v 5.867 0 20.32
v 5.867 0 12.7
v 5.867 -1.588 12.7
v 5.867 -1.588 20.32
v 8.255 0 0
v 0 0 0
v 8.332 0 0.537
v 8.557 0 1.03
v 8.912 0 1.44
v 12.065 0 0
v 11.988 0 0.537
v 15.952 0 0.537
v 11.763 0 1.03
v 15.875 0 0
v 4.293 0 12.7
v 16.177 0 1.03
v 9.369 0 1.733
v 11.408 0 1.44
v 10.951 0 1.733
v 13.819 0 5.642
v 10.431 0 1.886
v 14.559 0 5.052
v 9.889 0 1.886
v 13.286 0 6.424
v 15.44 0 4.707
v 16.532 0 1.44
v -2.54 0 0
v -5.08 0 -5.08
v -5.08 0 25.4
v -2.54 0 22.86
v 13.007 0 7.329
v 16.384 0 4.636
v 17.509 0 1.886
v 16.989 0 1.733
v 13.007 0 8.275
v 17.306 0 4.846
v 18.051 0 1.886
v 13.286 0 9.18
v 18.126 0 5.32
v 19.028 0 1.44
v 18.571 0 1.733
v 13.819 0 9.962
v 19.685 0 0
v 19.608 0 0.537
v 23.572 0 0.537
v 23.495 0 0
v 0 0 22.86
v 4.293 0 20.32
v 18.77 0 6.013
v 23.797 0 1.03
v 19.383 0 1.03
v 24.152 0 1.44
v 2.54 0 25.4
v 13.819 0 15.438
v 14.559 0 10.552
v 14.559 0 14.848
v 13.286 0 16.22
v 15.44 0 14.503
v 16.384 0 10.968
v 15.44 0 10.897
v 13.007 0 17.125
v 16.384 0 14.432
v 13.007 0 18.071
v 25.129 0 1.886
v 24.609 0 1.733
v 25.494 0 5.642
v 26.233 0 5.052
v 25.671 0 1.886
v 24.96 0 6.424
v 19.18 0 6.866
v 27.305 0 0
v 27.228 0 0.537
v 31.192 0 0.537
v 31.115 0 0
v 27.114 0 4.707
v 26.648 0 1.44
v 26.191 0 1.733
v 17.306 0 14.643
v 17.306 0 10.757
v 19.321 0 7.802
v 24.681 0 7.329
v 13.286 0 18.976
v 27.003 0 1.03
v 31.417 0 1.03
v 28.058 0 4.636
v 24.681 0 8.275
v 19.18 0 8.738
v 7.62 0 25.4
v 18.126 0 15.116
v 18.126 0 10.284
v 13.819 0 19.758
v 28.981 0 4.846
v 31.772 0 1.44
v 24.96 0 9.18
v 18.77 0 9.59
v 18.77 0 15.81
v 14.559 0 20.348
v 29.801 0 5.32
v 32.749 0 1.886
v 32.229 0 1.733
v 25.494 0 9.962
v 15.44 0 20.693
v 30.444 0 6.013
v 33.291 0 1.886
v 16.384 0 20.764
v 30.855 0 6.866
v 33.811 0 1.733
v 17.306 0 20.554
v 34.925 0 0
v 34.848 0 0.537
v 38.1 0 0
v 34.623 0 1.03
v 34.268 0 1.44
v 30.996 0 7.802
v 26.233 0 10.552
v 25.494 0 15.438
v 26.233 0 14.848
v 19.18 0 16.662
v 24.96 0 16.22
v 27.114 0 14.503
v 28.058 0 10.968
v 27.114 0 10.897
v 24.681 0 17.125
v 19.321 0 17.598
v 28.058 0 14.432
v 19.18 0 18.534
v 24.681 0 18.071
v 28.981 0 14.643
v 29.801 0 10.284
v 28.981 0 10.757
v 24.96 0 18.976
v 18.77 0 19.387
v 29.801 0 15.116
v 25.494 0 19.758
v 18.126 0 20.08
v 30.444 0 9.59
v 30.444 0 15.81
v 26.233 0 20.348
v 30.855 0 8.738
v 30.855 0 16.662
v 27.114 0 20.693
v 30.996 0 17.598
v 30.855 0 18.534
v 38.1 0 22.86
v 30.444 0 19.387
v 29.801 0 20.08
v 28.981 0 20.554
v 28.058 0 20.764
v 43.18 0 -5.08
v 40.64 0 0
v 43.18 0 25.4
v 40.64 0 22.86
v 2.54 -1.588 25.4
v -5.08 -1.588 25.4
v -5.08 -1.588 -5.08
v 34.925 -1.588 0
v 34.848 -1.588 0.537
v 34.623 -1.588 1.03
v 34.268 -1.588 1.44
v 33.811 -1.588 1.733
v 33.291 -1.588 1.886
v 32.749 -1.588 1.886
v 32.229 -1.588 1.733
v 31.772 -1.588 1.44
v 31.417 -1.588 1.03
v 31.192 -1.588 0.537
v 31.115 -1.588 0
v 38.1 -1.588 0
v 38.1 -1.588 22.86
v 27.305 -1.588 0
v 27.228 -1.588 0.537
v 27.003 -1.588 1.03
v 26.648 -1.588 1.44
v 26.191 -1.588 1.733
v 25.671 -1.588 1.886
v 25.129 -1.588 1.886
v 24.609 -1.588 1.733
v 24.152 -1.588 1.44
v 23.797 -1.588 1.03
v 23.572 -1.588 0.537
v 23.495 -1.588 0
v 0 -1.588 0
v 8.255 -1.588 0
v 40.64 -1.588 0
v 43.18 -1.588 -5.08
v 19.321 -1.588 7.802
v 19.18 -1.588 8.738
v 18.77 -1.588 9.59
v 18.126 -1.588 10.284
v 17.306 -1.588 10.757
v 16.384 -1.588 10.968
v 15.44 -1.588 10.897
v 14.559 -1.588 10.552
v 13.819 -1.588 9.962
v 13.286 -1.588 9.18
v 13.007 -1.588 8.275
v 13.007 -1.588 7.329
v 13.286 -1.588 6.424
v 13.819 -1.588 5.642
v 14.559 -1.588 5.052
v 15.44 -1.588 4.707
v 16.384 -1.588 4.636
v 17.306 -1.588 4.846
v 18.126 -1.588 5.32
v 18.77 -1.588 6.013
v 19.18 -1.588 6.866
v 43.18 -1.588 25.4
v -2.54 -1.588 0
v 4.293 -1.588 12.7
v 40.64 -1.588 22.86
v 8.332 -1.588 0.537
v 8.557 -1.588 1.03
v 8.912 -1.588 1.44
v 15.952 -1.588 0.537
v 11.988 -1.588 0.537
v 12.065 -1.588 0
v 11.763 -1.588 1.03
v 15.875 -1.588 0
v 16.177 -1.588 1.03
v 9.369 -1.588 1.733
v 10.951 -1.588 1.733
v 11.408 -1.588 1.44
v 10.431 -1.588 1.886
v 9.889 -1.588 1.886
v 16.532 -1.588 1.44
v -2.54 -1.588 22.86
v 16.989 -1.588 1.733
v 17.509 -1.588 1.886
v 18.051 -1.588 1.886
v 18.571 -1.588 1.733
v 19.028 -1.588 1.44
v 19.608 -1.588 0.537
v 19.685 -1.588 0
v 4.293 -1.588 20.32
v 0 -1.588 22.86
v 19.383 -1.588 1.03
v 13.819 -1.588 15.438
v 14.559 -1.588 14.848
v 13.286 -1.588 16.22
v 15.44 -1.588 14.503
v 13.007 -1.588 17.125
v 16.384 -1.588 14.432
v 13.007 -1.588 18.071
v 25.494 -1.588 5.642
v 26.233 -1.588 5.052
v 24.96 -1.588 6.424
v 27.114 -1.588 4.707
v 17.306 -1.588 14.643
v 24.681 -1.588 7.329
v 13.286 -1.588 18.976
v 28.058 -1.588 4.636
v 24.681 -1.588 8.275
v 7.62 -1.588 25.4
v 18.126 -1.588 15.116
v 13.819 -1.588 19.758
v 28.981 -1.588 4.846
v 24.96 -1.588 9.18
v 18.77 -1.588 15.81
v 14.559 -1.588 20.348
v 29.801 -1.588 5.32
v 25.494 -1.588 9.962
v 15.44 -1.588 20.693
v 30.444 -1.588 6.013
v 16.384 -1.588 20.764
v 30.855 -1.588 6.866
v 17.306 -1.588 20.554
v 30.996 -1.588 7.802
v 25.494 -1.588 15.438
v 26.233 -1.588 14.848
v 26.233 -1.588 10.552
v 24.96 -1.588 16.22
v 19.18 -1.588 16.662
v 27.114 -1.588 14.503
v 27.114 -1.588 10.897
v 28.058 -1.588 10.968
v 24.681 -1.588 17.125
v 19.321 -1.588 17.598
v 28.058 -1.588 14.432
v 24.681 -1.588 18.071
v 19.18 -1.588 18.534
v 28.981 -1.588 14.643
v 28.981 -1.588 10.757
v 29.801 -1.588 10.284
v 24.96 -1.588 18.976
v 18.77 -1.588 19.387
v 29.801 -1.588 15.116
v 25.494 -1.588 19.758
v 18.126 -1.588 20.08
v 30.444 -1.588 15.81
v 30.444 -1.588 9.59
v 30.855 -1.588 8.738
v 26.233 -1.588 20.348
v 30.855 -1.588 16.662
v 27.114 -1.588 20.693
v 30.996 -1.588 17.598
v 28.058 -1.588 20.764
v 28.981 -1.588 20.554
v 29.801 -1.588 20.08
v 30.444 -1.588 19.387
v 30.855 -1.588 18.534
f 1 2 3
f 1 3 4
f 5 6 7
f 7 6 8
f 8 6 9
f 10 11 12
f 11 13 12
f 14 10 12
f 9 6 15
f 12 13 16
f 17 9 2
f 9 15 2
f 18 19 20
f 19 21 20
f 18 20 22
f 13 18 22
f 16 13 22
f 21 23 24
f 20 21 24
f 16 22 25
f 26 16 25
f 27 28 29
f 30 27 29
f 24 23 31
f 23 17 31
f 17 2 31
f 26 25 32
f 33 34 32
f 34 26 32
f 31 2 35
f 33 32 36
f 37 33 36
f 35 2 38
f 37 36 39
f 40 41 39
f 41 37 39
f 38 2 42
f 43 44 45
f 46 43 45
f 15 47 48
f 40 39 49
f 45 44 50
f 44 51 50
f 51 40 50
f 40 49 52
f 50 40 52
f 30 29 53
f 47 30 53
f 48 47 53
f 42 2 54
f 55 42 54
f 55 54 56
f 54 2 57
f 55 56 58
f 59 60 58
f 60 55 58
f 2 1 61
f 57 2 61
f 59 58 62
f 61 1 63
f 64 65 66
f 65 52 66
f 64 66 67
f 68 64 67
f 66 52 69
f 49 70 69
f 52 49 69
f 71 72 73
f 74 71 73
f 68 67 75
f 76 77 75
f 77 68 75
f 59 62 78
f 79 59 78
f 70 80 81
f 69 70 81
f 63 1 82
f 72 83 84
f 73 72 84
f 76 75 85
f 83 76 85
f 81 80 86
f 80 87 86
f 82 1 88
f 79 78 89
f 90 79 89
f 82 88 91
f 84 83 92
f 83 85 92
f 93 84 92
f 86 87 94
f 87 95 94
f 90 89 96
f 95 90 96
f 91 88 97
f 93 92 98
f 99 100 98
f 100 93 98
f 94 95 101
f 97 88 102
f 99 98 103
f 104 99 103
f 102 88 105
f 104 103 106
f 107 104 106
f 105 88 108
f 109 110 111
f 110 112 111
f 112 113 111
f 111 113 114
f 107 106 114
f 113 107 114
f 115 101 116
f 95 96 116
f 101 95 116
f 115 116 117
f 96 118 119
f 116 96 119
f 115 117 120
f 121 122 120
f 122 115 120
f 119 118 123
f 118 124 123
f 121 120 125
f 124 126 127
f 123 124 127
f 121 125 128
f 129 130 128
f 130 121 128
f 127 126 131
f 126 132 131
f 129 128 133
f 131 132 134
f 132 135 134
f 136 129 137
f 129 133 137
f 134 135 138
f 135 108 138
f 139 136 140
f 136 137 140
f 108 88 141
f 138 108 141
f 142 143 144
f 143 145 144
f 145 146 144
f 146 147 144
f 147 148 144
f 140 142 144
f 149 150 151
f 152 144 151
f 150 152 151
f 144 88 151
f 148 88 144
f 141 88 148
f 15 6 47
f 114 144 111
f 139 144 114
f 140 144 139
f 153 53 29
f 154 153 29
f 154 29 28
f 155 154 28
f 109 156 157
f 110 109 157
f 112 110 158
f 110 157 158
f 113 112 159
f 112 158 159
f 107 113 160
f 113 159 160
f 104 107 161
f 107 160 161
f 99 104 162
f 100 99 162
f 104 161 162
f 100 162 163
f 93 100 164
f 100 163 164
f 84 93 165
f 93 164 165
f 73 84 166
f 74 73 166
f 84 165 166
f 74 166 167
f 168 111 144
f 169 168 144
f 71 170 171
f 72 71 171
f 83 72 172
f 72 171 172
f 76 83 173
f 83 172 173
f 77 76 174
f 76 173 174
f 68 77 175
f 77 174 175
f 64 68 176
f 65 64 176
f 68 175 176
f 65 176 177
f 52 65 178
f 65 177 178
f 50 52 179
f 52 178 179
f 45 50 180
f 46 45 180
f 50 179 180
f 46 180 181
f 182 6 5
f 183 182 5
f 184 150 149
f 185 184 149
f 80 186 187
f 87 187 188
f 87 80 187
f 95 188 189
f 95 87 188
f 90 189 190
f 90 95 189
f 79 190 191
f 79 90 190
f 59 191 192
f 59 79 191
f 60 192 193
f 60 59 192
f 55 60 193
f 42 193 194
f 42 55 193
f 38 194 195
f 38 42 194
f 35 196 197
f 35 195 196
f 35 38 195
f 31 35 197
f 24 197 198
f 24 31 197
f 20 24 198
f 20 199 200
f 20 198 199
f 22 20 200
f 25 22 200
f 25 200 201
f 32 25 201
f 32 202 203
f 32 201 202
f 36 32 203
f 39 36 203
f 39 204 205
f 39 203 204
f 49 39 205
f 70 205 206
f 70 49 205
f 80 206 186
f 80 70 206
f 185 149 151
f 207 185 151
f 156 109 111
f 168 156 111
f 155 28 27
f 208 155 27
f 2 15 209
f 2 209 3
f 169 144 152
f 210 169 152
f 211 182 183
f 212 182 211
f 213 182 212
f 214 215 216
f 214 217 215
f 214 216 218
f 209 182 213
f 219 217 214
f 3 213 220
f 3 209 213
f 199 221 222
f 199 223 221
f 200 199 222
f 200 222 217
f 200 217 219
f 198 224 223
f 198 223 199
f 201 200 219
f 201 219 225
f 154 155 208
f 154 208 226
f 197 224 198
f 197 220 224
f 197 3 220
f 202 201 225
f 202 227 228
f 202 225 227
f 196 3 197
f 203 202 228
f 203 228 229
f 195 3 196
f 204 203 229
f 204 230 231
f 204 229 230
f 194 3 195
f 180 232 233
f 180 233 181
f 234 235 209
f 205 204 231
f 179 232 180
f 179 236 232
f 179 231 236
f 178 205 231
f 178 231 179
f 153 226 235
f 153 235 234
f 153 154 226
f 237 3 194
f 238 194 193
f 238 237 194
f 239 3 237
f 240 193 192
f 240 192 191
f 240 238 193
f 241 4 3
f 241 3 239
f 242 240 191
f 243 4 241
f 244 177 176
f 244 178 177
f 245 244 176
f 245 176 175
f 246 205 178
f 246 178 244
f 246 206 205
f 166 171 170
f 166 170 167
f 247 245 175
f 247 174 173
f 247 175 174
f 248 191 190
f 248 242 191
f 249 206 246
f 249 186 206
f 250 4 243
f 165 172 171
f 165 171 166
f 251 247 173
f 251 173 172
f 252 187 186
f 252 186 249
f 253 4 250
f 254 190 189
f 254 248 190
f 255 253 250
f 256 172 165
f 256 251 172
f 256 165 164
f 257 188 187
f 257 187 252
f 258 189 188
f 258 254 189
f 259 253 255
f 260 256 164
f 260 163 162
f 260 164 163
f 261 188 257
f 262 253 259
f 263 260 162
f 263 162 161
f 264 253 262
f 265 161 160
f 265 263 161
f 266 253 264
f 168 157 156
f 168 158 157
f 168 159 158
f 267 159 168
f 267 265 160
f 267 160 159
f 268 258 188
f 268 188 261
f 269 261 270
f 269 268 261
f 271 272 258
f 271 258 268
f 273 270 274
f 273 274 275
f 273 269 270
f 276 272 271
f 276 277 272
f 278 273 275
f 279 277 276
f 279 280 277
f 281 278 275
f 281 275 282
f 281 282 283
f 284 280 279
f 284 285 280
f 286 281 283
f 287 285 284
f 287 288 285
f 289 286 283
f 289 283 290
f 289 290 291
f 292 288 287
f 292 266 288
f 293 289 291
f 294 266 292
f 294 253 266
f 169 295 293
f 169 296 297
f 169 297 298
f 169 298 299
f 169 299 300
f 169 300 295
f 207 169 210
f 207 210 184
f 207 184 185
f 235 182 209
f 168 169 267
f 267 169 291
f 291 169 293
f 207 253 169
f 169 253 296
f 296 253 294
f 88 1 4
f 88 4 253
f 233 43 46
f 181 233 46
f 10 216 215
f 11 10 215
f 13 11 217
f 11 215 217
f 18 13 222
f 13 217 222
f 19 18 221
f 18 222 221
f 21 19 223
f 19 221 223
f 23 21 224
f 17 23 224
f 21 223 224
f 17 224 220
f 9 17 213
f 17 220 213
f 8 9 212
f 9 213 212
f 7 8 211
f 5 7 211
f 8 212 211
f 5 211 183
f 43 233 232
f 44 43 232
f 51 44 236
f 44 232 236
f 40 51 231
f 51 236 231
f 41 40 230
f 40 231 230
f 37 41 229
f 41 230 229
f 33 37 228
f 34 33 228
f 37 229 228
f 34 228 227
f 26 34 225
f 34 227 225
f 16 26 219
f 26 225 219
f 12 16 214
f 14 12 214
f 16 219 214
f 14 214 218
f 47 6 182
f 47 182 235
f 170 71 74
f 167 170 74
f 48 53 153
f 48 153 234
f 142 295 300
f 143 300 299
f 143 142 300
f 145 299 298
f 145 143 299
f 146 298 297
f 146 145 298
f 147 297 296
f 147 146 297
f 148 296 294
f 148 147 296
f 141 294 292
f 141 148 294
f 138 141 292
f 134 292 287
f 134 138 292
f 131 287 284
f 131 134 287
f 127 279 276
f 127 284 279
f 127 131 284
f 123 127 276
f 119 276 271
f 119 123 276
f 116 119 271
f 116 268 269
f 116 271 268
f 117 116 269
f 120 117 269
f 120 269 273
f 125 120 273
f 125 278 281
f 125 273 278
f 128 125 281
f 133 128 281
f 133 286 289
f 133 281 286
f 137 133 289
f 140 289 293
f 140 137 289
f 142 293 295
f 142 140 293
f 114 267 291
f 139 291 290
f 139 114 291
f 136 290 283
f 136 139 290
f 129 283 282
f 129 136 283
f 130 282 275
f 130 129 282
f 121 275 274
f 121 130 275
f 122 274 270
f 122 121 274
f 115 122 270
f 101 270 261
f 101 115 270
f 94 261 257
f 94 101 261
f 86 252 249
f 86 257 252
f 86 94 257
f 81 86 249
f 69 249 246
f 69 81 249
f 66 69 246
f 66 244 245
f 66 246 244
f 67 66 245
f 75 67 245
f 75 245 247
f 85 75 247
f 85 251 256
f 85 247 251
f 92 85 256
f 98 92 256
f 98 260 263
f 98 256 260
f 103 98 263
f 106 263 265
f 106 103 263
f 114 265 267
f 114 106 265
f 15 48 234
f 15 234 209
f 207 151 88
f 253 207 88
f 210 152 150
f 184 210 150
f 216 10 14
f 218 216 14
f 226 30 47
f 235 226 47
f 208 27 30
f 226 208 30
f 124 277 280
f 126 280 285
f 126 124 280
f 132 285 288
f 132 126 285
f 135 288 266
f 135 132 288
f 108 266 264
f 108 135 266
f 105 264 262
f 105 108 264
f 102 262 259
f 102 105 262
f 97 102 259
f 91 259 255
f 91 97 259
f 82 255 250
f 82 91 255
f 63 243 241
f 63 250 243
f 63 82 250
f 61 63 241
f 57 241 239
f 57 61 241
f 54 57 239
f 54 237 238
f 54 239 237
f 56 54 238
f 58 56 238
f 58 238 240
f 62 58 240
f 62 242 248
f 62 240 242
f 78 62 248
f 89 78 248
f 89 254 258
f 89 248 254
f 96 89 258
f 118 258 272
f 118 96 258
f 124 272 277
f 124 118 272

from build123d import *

# Parameters (mm, degrees)
F0_W     = 38.1
F0_H     = 25.4
F1_DEPTH = 1.5875
F3_DEPTH = 1.5875
F5_DEPTH = 1.5885
F6_R     = 3.175
F7_DEPTH = 1.5885
F8_R     = 1.905
F9_DEPTH = 25.4


with BuildPart() as f1:
    # F0 (on Front) → F1 (new body)
    with BuildSketch(Plane.XZ):
        with Locations((19.05, 12.7)):
            Rectangle(F0_W, F0_H)
    extrude(amount=F1_DEPTH)

    # F2 (on Front) → F3 (join, through all)
    with BuildSketch(Plane.XZ):
        Polygon((43.18, 25.4), (38.1, 25.4), (38.1, 22.86), (40.64, 22.86), (40.64, 0), (43.18, -5.08), align=None)
        Polygon((-2.54, 22.86), (0, 22.86), (0, 25.4), (-5.08, 25.4), (-5.08, -5.08), (-2.54, 0), align=None)
    extrude(amount=F3_DEPTH)

    # F4 (on Front) → F5 (cut, through all)
    with BuildSketch(Plane.XZ):
        Polygon((7.62, 25.4), (2.54, 25.4), (4.2926, 20.32), (4.2926, 12.7), (5.8674, 12.7), (5.8674, 20.32), align=None)
    extrude(amount=F5_DEPTH, mode=Mode.SUBTRACT)

    # F6 (on Front) → F7 (cut, through all)
    with BuildSketch(Plane.XZ):
        with Locations((16.146441, 17.598042)):
            Circle(F6_R)
        with Locations((27.820959, 17.598042)):
            Circle(F6_R)
        with Locations((16.146441, 7.801958)):
            Circle(F6_R)
        with Locations((27.820959, 7.801958)):
            Circle(F6_R)
    extrude(amount=F7_DEPTH, mode=Mode.SUBTRACT)

    # F8 (on face) → F9 (cut)
    with BuildSketch(Plane.XZ.offset(1.5875)):
        with Locations((10.16, 0)):
            Circle(F8_R)
        with Locations((17.78, 0)):
            Circle(F8_R)
        with Locations((25.4, 0)):
            Circle(F8_R)
        with Locations((33.02, 0)):
            Circle(F8_R)
    extrude(amount=-F9_DEPTH, mode=Mode.SUBTRACT)


solid = f1.part
